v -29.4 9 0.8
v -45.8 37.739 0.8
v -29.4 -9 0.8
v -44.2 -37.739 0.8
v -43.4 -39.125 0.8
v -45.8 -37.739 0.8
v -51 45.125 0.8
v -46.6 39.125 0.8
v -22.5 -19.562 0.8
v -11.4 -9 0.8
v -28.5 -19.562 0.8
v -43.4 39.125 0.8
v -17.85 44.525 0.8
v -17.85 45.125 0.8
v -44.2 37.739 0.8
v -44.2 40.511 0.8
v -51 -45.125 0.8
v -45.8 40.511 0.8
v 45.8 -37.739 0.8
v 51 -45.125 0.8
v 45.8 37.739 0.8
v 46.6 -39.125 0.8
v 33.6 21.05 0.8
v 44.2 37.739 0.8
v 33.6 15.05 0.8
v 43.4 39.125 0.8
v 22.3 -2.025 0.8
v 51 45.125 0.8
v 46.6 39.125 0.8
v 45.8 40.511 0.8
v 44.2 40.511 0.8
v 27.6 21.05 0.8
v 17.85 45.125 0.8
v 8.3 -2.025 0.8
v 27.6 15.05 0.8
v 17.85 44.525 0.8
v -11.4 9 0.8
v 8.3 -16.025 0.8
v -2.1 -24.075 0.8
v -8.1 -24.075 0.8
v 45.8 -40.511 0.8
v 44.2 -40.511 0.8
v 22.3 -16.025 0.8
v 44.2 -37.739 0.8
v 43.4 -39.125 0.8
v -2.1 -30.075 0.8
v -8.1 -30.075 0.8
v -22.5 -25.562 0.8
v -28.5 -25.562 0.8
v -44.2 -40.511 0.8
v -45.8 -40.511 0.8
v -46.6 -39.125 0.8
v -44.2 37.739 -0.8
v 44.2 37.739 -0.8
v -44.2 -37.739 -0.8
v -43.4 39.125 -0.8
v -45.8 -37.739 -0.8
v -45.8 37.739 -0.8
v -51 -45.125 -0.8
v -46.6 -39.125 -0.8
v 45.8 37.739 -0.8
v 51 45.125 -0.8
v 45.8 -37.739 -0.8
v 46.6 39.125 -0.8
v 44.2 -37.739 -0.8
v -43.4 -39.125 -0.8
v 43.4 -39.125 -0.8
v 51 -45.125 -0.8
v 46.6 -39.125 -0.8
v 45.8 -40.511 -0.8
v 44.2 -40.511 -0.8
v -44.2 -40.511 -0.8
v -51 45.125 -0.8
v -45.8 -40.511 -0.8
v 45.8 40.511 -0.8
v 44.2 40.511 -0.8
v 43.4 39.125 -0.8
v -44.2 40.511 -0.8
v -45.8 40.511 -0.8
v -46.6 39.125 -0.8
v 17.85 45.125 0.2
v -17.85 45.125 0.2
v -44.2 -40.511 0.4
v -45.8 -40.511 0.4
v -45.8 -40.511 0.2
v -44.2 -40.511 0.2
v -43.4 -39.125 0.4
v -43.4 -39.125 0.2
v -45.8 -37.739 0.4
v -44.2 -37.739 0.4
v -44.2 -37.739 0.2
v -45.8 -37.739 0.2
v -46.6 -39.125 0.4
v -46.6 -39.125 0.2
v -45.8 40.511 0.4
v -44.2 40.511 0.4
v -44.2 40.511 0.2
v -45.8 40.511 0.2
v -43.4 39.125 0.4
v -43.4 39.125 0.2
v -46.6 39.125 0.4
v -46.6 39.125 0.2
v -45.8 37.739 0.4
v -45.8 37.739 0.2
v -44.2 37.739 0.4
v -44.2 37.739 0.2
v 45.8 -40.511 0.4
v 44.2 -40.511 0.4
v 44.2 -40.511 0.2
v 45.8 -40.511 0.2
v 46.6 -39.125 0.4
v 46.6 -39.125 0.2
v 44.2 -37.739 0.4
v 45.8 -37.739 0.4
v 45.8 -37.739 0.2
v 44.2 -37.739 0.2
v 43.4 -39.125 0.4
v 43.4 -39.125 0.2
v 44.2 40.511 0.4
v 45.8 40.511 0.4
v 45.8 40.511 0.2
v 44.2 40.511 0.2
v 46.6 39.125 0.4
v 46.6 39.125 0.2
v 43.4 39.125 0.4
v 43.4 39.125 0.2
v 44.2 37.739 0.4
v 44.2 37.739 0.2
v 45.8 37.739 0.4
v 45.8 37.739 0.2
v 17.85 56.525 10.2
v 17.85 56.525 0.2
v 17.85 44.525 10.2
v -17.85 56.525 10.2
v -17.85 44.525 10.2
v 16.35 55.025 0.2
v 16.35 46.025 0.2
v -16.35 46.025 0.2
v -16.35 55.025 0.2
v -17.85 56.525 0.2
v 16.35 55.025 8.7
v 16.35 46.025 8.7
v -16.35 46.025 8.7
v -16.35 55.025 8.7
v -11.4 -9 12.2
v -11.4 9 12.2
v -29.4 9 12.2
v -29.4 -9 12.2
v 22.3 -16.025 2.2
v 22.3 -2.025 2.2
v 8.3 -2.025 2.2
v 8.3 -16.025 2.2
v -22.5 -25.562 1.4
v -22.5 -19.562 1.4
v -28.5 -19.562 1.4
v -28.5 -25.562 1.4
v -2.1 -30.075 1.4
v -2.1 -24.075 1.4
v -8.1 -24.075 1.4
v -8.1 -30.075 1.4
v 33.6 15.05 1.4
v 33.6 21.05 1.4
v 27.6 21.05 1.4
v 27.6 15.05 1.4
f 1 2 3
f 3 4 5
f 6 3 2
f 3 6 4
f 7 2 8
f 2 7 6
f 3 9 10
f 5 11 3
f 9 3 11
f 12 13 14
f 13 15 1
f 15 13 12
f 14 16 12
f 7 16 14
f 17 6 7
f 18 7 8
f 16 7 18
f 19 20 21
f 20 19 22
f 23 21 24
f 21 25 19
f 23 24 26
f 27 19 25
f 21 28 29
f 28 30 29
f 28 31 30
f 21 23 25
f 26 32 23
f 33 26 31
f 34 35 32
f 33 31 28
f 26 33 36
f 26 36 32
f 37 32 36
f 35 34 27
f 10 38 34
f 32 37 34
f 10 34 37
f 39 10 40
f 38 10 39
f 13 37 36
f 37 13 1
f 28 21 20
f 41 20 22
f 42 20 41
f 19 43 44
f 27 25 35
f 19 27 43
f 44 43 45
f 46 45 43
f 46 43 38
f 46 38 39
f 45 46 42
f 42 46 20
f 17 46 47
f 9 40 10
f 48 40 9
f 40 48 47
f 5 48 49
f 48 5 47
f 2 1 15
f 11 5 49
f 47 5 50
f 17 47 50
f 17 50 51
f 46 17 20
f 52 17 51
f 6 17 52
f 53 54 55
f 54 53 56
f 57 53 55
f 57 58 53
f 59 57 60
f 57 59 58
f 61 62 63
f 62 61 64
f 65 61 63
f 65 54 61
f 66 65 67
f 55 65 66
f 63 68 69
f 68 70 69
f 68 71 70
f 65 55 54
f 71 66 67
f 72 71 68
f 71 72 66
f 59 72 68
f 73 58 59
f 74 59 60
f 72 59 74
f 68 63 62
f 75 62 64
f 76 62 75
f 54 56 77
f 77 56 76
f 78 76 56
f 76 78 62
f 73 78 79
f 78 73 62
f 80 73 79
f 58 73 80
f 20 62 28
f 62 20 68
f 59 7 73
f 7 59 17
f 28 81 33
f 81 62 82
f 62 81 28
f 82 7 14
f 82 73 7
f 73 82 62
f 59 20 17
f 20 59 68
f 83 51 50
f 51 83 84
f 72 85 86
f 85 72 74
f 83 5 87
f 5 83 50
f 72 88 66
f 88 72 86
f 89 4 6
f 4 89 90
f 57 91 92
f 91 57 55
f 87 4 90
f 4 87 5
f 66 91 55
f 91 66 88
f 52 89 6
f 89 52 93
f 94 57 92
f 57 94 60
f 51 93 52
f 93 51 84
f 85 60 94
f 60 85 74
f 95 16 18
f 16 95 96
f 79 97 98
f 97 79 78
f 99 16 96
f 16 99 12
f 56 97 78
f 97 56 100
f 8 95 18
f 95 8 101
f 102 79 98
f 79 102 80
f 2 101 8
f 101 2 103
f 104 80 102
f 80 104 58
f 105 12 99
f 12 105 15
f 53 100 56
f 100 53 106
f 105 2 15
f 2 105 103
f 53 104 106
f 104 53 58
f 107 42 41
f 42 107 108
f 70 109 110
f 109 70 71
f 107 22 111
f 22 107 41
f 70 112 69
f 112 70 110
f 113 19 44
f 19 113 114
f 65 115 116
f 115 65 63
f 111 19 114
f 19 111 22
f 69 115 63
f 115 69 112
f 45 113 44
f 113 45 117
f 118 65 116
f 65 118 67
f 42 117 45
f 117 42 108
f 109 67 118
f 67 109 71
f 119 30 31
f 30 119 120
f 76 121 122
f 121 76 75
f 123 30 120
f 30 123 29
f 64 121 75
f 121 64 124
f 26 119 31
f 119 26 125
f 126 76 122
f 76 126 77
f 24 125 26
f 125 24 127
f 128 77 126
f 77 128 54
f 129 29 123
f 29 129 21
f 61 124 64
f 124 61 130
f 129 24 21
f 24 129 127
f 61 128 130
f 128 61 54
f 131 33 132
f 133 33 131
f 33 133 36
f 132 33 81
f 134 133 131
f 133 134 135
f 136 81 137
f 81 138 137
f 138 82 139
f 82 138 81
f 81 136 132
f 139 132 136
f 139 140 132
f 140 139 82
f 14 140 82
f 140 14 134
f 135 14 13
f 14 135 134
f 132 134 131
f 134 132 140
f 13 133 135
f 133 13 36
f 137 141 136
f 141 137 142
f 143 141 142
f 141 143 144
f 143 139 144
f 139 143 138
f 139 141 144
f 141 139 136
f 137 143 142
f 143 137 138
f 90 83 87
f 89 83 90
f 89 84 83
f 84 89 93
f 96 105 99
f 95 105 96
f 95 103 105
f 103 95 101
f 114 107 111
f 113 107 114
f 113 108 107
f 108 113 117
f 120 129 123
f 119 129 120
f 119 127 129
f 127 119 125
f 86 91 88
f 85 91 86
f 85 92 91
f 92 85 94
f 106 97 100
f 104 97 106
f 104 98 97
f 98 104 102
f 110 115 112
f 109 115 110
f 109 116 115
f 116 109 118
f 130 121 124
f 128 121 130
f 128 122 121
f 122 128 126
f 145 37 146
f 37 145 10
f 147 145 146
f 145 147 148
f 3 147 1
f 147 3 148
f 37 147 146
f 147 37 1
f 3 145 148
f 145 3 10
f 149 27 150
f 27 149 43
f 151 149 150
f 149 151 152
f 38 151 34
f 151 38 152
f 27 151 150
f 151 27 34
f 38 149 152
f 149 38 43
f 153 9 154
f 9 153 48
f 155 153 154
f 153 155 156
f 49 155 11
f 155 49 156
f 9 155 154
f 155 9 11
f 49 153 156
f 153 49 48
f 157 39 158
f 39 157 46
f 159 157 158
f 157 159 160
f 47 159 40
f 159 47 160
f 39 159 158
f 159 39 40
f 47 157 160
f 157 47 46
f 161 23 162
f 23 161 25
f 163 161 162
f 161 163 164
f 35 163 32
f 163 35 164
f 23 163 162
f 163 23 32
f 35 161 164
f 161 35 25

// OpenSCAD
// Parameters
pcb_length = 102.0; //[51.0:204.0:0.25]
pcb_width = 90.25; //[45.0:180.5:0.25]
pcb_thickness = 1.6; //[0.8:3.2:0.1]
corner_radius = 4.0; //[2.0:8.0:0.25]
hole_diameter = 3.2; //[2.0:5.0:0.1]
hole_edge_offset_x = 6.0; //[3.0:12.0:0.25]
hole_edge_offset_y = 6.0; //[3.0:12.0:0.25]
hole_overlap = 0.5; //[0.2:2.0:0.1]
component_base_overlap = 0.6; //[0.2:2.0:0.1]
silkscreen_thickness = 0.2; //[0.1:0.6:0.05]
silkscreen_inset = 2.0; //[0.5:6.0:0.25]
connector_height = 10.0; //[5.0:20.0:0.5]
connector_depth = 12.0; //[6.0:24.0:0.5]
connector_wall = 1.5; //[0.8:3.0:0.1]
heatsink_size_x = 18.0; //[9.0:36.0:0.5]
heatsink_size_y = 18.0; //[9.0:36.0:0.5]
heatsink_height = 12.0; //[6.0:24.0:0.5]
chip_size_x = 14.0; //[7.0:28.0:0.5]
chip_size_y = 14.0; //[7.0:28.0:0.5]
chip_height = 2.0; //[1.0:6.0:0.1]
small_comp_height = 1.2; //[0.6:4.0:0.1]
small_comp_size = 6.0; //[3.0:12.0:0.25]

// PCB Main Body with Rounded Corners
module pcb_main_body() {
  color([0.0, 0.4, 0.2]) // Green PCB
  difference() {
    union() {
      translate([0, 0, 0])
        cube([pcb_length, pcb_width, pcb_thickness], center=true);
      for (x = [-1, 1], y = [-1, 1]) {
        translate([x * (pcb_length/2 - corner_radius), y * (pcb_width/2 - corner_radius), 0])
          cylinder(r=corner_radius, h=pcb_thickness, center=true);
      }
    }
    // Mounting Holes
    for (x = [-1, 1], y = [-1, 1]) {
      translate([x * (pcb_length/2 - hole_edge_offset_x), y * (pcb_width/2 - hole_edge_offset_y), 0])
        cylinder(r=hole_diameter/2, h=pcb_thickness + hole_overlap*2, center=true);
    }
  }
}

// Silkscreen Markings
module silkscreen_markings() {
  color("White")
  translate([0, 0, pcb_thickness/2 + silkscreen_thickness/2 - component_base_overlap])
    cube([pcb_length - silkscreen_inset*2, pcb_width - silkscreen_inset*2, silkscreen_thickness], center=true);
}

// Connector
module connector() {
  color("Black")
  difference() {
    translate([0, pcb_width/2 + connector_depth/2 - component_base_overlap, pcb_thickness/2 + connector_height/2 - component_base_overlap])
      cube([pcb_length*0.35, connector_depth, connector_height], center=true);
    translate([0, pcb_width/2 + connector_depth/2 - component_base_overlap, pcb_thickness/2 + (connector_height - connector_wall)/2 - component_base_overlap])
      cube([pcb_length*0.35 - connector_wall*2, connector_depth - connector_wall*2, connector_height - connector_wall], center=true);
  }
}

// Heatsink
module heatsink() {
  color("DimGray")
  translate([-pcb_length*0.2, 0, pcb_thickness/2 + heatsink_height/2 - component_base_overlap])
    cube([heatsink_size_x, heatsink_size_y, heatsink_height], center=true);
}

// Main Chip
module chip() {
  color("Black")
  translate([pcb_length*0.15, -pcb_width*0.1, pcb_thickness/2 + chip_height/2 - component_base_overlap])
    cube([chip_size_x, chip_size_y, chip_height], center=true);
}

// Small Components
module small_component(x, y) {
  color("Black")
  translate([x, y, pcb_thickness/2 + small_comp_height/2 - component_base_overlap])
    cube([small_comp_size, small_comp_size, small_comp_height], center=true);
}

// Assemble PCB with Components
module complete_model() {
  pcb_main_body();
  silkscreen_markings();
  connector();
  heatsink();
  chip();
  small_component(-pcb_length*0.25, -pcb_width*0.25);
  small_component(-pcb_length*0.05, -pcb_width*0.3);
  small_component(pcb_length*0.3, pcb_width*0.2);
}

// Render the complete model
complete_model();
